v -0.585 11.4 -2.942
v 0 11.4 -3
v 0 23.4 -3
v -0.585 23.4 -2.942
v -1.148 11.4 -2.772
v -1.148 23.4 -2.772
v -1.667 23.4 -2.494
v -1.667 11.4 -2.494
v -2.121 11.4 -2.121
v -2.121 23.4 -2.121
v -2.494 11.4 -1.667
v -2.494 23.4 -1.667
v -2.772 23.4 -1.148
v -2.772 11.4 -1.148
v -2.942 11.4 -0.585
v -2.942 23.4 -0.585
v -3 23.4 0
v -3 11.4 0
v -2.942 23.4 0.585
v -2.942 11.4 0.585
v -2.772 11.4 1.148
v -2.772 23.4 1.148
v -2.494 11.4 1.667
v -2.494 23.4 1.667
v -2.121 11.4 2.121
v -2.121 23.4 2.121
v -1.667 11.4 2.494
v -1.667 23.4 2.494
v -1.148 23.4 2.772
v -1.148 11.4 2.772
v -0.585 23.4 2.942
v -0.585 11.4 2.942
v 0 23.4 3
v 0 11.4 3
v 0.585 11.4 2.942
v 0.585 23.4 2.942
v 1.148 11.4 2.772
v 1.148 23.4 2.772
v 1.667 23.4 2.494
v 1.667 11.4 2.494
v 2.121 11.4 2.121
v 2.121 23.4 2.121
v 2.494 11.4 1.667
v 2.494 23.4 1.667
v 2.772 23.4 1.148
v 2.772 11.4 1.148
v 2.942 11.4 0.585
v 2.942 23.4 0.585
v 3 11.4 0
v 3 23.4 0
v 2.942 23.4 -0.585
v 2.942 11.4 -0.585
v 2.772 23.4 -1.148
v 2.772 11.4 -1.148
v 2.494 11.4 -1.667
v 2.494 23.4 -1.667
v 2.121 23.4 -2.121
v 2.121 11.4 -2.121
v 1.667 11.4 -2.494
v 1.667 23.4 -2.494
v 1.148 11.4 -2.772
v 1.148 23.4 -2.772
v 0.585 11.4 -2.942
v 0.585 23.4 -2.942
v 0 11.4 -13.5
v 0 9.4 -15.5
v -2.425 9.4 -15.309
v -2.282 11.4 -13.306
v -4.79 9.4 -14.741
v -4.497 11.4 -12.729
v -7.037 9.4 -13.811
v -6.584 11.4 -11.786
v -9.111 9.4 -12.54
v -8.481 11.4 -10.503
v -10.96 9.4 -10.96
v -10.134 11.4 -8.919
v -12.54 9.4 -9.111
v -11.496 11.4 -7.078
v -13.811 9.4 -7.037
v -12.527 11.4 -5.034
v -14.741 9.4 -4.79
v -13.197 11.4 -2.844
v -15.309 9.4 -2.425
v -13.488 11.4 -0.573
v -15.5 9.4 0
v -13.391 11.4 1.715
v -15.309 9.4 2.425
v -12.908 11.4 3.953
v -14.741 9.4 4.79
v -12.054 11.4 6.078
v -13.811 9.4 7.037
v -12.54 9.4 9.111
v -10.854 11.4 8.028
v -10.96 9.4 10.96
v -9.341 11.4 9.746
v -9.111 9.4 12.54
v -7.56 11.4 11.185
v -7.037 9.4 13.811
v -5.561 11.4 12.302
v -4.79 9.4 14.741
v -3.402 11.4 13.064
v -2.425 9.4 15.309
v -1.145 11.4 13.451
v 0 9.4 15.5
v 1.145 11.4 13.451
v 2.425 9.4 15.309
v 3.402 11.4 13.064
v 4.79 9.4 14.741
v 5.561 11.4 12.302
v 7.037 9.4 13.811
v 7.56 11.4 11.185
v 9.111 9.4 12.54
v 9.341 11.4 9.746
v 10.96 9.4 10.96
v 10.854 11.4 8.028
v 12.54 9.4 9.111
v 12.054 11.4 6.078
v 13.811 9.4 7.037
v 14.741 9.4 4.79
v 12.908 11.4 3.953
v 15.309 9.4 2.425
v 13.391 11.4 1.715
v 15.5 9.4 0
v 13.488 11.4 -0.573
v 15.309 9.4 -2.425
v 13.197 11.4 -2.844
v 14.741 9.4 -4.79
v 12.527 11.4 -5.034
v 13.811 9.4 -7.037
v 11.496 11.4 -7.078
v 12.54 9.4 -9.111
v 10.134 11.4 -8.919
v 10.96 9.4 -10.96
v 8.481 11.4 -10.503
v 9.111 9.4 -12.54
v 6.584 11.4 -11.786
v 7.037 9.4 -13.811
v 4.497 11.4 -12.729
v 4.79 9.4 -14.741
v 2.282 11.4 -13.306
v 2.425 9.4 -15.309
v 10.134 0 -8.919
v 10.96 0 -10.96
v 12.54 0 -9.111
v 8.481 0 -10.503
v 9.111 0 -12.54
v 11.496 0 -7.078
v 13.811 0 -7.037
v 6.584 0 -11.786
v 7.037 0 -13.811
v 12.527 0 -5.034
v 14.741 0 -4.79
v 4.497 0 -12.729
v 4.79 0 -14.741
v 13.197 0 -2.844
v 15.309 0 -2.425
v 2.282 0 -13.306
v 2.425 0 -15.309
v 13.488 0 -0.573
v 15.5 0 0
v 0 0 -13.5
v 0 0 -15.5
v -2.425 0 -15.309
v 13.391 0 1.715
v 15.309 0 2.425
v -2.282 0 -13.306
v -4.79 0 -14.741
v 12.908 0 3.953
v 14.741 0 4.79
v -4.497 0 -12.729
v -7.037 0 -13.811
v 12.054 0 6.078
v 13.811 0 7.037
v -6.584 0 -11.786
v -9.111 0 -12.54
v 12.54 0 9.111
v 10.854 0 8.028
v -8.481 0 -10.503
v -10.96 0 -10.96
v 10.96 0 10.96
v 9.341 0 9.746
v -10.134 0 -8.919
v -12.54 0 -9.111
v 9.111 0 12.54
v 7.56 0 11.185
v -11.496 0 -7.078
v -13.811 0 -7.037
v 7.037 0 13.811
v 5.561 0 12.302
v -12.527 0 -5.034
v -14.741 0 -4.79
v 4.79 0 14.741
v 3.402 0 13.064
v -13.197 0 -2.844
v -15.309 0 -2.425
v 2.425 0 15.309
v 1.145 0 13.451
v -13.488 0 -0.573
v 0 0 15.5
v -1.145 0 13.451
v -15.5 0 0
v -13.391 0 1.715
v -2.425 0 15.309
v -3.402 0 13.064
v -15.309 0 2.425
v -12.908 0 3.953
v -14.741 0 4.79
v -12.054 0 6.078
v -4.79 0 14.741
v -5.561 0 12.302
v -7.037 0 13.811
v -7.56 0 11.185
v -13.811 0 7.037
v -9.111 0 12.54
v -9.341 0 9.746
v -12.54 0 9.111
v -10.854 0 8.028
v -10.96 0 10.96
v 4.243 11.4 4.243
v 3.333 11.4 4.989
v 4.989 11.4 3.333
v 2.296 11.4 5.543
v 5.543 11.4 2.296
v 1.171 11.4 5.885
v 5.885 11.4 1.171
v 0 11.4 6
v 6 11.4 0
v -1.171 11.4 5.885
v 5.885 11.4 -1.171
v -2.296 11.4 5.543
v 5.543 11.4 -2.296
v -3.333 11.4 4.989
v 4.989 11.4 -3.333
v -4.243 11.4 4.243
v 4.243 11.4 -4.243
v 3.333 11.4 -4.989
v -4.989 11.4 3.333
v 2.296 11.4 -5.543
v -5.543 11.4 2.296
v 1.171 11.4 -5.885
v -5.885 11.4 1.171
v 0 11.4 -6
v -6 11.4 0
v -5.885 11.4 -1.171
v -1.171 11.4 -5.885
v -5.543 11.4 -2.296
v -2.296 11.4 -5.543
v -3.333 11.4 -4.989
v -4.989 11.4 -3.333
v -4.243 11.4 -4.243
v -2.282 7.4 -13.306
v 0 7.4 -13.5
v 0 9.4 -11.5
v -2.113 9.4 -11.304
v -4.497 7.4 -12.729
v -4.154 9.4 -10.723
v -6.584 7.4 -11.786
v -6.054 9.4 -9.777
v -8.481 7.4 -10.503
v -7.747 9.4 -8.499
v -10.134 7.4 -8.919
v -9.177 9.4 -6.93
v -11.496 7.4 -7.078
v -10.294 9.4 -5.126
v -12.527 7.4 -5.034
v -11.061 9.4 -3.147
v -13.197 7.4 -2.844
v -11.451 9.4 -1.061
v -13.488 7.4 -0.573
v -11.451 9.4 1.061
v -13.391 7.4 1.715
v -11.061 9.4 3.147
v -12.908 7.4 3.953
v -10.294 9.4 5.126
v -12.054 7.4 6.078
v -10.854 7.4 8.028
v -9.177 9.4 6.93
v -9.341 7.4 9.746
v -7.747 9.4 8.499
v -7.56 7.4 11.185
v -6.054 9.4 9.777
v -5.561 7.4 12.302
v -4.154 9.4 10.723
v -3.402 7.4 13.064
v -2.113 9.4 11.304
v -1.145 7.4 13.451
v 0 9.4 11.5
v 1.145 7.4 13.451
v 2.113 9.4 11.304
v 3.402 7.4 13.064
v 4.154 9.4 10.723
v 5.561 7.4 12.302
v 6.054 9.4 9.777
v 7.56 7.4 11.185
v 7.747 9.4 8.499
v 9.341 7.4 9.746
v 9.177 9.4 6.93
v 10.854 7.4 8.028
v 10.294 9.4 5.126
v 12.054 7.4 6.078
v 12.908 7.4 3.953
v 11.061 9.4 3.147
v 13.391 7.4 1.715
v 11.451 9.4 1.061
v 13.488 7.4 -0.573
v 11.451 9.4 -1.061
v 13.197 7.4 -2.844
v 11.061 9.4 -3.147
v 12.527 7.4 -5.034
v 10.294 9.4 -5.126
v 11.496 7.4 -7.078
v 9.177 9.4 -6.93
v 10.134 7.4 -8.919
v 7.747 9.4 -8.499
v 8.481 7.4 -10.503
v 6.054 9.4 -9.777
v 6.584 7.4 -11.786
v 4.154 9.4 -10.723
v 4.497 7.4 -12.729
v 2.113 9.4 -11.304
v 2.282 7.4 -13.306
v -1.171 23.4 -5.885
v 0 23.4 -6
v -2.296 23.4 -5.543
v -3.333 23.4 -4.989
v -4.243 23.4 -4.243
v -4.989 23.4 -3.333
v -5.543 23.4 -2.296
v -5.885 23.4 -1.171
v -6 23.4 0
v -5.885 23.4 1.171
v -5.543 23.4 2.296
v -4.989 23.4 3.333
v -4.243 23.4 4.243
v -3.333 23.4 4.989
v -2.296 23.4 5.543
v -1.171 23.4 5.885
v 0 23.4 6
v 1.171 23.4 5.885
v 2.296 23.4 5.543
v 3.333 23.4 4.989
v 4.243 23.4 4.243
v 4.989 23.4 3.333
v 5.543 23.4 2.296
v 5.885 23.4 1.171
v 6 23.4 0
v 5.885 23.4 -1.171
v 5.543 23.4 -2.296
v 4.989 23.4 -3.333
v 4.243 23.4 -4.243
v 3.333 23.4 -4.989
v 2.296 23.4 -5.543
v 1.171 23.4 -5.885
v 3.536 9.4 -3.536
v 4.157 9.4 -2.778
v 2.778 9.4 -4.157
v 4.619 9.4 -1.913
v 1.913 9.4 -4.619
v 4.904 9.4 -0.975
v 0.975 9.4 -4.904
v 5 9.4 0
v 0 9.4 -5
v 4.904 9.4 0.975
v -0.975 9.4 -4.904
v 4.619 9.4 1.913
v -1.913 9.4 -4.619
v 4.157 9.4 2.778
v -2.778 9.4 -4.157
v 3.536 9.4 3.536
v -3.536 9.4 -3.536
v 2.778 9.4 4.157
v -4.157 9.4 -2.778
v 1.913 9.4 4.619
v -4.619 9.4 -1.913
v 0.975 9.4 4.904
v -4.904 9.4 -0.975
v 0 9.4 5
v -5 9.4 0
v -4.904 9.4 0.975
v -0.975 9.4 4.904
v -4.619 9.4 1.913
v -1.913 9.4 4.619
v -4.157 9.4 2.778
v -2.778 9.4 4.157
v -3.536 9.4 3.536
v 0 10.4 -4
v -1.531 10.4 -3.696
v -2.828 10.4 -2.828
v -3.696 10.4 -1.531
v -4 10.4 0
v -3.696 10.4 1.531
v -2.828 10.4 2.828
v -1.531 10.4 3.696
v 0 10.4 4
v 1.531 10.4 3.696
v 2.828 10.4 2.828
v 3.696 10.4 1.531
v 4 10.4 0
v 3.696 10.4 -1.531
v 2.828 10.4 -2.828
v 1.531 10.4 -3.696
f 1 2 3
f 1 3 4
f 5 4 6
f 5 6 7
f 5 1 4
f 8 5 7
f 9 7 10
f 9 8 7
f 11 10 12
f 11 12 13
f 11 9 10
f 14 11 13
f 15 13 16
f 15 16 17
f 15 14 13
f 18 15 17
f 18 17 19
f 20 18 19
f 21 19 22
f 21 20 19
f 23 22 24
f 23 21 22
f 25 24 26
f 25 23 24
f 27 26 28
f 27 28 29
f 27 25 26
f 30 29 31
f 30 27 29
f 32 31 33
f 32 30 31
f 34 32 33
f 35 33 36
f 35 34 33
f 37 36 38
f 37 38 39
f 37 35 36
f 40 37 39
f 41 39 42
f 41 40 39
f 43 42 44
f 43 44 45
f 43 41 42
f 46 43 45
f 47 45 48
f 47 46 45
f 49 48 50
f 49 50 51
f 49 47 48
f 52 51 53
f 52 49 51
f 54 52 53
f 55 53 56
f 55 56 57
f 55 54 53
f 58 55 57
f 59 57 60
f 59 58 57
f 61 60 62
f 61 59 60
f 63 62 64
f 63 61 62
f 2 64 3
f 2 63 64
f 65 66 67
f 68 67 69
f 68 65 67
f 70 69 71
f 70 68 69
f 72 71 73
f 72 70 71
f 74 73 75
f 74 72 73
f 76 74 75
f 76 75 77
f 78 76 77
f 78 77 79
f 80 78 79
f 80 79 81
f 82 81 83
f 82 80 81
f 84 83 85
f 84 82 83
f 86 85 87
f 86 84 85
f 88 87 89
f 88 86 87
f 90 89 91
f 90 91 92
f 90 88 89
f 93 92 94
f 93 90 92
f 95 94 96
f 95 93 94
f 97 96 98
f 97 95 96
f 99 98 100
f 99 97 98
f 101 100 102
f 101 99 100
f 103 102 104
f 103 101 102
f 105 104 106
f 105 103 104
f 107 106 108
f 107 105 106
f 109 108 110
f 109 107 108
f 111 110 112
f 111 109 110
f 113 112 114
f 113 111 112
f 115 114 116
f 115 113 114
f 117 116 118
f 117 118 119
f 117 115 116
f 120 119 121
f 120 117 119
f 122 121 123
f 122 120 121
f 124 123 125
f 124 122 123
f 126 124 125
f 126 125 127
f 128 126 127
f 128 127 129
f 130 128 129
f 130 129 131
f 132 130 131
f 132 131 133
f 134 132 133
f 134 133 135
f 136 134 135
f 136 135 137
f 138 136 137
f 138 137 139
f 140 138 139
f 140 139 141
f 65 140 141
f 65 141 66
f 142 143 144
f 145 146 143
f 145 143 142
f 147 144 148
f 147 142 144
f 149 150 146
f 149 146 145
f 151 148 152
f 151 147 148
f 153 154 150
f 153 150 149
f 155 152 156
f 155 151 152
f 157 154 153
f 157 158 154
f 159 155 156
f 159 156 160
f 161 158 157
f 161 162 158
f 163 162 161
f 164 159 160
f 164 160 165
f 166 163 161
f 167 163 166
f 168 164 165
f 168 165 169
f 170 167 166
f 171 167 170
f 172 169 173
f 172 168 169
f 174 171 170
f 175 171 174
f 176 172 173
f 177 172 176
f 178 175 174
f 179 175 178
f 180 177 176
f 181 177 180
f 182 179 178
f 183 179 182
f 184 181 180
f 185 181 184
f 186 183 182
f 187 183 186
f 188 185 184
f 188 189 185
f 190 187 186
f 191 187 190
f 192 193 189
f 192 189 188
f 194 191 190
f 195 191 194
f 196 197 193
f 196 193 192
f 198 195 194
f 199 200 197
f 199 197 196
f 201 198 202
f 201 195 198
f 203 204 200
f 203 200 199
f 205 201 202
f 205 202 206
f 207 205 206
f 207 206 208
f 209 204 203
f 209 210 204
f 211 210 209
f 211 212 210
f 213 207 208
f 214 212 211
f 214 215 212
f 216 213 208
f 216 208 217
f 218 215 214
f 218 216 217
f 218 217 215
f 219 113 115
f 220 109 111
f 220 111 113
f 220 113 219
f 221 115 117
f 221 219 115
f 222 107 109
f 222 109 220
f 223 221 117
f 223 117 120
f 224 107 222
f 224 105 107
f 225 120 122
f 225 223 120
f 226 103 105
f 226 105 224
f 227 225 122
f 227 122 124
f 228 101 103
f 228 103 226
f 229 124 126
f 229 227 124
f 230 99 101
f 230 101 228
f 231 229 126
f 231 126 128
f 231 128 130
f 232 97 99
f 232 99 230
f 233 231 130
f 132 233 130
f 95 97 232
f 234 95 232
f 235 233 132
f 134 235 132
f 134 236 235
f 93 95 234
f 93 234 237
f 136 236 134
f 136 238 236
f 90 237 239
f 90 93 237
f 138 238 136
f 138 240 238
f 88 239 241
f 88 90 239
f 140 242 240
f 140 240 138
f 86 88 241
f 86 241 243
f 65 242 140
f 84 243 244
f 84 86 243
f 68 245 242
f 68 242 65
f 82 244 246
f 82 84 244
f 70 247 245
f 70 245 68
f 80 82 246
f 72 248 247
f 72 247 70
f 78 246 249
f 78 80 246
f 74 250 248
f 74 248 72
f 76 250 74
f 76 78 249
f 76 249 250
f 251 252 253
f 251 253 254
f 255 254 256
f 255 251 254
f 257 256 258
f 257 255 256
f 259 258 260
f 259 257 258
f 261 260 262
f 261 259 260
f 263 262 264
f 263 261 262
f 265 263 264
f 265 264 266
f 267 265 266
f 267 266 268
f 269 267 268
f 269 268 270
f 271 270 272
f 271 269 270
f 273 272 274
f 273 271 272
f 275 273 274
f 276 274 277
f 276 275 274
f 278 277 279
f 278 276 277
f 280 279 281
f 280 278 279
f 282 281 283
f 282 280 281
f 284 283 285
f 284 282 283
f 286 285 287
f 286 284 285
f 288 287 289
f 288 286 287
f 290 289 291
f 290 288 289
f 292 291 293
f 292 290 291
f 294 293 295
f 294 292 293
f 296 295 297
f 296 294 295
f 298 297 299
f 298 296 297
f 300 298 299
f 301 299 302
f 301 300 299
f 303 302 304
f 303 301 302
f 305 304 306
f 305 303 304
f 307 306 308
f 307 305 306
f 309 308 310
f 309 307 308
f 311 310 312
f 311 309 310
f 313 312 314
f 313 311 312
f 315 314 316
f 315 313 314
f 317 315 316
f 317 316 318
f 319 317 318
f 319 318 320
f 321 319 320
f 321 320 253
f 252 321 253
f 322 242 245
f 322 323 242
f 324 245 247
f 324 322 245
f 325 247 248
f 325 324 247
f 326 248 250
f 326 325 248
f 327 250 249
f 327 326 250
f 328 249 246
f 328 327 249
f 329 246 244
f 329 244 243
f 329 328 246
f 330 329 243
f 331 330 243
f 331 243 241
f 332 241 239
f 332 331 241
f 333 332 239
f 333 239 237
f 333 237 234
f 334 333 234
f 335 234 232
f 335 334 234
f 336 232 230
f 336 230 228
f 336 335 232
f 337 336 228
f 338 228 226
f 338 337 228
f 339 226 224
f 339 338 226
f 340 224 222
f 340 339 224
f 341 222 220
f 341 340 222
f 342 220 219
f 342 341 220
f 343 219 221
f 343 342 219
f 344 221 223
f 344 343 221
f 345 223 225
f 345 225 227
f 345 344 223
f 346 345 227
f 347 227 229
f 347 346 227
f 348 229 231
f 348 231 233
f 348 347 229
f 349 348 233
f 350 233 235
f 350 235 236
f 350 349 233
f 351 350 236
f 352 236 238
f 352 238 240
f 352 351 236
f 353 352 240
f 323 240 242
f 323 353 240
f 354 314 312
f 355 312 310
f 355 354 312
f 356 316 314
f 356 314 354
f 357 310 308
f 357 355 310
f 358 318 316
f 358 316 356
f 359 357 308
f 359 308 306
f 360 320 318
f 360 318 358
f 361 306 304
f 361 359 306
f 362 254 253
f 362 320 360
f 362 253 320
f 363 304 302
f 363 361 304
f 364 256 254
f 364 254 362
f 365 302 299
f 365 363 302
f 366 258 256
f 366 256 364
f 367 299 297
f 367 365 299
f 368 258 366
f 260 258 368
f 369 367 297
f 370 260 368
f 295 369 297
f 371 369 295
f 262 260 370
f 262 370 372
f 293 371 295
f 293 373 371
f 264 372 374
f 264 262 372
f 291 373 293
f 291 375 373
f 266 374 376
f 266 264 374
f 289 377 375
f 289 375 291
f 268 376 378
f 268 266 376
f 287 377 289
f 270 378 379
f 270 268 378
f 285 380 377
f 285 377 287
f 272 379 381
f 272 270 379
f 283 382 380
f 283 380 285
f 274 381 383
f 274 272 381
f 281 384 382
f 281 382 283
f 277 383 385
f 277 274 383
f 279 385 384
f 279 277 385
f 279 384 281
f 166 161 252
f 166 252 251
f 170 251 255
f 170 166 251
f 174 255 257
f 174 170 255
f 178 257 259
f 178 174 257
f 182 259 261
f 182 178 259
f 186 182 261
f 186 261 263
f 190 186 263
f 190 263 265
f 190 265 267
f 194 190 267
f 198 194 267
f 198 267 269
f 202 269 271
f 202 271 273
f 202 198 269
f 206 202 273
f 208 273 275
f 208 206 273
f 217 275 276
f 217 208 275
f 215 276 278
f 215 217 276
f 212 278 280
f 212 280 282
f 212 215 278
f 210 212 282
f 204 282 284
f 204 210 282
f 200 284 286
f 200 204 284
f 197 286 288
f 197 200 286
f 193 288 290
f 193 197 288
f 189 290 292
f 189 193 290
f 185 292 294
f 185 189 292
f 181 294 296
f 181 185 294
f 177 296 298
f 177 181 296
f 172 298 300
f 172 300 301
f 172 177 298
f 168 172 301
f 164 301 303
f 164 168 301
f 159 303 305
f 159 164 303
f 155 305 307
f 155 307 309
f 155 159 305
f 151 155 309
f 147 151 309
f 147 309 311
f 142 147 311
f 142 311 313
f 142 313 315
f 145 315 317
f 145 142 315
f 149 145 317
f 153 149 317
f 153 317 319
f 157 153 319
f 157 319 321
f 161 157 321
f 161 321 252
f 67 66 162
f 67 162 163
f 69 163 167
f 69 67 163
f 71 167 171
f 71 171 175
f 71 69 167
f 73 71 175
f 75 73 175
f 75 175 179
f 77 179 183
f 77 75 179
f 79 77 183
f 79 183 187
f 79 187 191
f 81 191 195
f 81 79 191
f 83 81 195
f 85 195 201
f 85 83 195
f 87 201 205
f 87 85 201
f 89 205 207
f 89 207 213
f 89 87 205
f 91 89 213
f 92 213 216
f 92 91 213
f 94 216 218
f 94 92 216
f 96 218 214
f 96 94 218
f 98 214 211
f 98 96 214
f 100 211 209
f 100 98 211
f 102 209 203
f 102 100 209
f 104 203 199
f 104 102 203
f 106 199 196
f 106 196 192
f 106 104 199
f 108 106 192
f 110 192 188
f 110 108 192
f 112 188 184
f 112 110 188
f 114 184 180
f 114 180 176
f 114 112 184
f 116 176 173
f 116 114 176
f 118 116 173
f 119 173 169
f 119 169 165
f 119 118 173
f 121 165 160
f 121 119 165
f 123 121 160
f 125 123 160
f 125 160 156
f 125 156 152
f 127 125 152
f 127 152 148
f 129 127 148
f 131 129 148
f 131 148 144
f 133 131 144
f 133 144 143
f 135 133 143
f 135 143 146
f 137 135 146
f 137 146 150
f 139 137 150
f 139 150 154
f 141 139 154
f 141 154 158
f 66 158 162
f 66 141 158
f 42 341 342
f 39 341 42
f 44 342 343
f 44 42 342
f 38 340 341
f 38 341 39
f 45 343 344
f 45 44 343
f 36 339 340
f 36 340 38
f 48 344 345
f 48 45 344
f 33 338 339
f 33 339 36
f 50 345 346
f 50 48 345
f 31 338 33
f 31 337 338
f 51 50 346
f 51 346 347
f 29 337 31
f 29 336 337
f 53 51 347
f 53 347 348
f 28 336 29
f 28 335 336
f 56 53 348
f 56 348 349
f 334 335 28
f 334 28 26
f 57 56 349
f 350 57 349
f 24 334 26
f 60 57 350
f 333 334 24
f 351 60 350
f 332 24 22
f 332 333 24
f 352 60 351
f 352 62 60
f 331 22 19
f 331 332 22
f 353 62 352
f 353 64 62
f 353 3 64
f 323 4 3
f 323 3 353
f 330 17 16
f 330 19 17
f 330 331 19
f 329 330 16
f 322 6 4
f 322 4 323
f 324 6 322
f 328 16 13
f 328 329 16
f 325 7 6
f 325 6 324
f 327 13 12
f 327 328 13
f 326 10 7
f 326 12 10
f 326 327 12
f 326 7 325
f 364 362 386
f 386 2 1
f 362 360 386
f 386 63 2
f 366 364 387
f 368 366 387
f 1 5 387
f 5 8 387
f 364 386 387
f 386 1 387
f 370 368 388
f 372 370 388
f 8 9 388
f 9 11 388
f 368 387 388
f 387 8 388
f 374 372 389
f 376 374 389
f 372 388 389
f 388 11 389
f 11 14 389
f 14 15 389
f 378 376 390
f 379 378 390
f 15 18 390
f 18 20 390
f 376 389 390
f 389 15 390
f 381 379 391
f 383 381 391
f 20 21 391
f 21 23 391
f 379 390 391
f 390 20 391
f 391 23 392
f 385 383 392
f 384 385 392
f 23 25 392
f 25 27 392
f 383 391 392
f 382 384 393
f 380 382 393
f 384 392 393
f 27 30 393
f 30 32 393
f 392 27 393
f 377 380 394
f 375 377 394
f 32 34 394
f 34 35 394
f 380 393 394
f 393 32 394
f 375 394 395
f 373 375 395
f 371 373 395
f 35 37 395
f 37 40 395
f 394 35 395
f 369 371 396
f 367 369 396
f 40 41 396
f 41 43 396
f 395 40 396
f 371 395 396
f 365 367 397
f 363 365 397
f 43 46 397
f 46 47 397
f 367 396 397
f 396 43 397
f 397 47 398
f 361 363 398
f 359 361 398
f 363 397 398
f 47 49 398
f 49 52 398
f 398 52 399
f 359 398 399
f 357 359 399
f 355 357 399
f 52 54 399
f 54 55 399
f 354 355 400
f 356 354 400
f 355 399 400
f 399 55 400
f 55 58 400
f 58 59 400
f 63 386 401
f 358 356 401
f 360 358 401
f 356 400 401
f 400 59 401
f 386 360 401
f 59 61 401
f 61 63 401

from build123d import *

# Parameters (mm, degrees)
CHAMFER1_SIZE = 2
CHAMFER2_SIZE = 2


with BuildPart() as part:
    # Sketch1 → Revolve1 (revolve)
    with BuildSketch(Plane.XY, mode=Mode.PRIVATE) as revolve1_sk:
        Polygon((-15.5, 0), (-15.5, 11.4), (-6, 11.4), (-6, 23.4), (-3, 23.4), (-3, 9.4), (-13.5, 9.4), (-13.5, 0), align=None)
    revolve(revolve1_sk.sketch.rotate(Axis((0, 0, 0), (0, 1, 0)), 270), axis=Axis((0, 0, 0), (0, 1, 0)))

    # Chamfer1
    chamfer1_edges = [part.edges().sort_by_distance(p)[0] for p in [
        (0, 9.4, 13.5),
        (0, 11.4, 15.5),
    ]]
    chamfer(chamfer1_edges, length=CHAMFER1_SIZE)

    # Chamfer2
    chamfer2_edges = [part.edges().sort_by_distance(p)[0] for p in [
        (0, 9.4, 3),
    ]]
    chamfer(chamfer2_edges, length=CHAMFER2_SIZE)


solid = part.part
